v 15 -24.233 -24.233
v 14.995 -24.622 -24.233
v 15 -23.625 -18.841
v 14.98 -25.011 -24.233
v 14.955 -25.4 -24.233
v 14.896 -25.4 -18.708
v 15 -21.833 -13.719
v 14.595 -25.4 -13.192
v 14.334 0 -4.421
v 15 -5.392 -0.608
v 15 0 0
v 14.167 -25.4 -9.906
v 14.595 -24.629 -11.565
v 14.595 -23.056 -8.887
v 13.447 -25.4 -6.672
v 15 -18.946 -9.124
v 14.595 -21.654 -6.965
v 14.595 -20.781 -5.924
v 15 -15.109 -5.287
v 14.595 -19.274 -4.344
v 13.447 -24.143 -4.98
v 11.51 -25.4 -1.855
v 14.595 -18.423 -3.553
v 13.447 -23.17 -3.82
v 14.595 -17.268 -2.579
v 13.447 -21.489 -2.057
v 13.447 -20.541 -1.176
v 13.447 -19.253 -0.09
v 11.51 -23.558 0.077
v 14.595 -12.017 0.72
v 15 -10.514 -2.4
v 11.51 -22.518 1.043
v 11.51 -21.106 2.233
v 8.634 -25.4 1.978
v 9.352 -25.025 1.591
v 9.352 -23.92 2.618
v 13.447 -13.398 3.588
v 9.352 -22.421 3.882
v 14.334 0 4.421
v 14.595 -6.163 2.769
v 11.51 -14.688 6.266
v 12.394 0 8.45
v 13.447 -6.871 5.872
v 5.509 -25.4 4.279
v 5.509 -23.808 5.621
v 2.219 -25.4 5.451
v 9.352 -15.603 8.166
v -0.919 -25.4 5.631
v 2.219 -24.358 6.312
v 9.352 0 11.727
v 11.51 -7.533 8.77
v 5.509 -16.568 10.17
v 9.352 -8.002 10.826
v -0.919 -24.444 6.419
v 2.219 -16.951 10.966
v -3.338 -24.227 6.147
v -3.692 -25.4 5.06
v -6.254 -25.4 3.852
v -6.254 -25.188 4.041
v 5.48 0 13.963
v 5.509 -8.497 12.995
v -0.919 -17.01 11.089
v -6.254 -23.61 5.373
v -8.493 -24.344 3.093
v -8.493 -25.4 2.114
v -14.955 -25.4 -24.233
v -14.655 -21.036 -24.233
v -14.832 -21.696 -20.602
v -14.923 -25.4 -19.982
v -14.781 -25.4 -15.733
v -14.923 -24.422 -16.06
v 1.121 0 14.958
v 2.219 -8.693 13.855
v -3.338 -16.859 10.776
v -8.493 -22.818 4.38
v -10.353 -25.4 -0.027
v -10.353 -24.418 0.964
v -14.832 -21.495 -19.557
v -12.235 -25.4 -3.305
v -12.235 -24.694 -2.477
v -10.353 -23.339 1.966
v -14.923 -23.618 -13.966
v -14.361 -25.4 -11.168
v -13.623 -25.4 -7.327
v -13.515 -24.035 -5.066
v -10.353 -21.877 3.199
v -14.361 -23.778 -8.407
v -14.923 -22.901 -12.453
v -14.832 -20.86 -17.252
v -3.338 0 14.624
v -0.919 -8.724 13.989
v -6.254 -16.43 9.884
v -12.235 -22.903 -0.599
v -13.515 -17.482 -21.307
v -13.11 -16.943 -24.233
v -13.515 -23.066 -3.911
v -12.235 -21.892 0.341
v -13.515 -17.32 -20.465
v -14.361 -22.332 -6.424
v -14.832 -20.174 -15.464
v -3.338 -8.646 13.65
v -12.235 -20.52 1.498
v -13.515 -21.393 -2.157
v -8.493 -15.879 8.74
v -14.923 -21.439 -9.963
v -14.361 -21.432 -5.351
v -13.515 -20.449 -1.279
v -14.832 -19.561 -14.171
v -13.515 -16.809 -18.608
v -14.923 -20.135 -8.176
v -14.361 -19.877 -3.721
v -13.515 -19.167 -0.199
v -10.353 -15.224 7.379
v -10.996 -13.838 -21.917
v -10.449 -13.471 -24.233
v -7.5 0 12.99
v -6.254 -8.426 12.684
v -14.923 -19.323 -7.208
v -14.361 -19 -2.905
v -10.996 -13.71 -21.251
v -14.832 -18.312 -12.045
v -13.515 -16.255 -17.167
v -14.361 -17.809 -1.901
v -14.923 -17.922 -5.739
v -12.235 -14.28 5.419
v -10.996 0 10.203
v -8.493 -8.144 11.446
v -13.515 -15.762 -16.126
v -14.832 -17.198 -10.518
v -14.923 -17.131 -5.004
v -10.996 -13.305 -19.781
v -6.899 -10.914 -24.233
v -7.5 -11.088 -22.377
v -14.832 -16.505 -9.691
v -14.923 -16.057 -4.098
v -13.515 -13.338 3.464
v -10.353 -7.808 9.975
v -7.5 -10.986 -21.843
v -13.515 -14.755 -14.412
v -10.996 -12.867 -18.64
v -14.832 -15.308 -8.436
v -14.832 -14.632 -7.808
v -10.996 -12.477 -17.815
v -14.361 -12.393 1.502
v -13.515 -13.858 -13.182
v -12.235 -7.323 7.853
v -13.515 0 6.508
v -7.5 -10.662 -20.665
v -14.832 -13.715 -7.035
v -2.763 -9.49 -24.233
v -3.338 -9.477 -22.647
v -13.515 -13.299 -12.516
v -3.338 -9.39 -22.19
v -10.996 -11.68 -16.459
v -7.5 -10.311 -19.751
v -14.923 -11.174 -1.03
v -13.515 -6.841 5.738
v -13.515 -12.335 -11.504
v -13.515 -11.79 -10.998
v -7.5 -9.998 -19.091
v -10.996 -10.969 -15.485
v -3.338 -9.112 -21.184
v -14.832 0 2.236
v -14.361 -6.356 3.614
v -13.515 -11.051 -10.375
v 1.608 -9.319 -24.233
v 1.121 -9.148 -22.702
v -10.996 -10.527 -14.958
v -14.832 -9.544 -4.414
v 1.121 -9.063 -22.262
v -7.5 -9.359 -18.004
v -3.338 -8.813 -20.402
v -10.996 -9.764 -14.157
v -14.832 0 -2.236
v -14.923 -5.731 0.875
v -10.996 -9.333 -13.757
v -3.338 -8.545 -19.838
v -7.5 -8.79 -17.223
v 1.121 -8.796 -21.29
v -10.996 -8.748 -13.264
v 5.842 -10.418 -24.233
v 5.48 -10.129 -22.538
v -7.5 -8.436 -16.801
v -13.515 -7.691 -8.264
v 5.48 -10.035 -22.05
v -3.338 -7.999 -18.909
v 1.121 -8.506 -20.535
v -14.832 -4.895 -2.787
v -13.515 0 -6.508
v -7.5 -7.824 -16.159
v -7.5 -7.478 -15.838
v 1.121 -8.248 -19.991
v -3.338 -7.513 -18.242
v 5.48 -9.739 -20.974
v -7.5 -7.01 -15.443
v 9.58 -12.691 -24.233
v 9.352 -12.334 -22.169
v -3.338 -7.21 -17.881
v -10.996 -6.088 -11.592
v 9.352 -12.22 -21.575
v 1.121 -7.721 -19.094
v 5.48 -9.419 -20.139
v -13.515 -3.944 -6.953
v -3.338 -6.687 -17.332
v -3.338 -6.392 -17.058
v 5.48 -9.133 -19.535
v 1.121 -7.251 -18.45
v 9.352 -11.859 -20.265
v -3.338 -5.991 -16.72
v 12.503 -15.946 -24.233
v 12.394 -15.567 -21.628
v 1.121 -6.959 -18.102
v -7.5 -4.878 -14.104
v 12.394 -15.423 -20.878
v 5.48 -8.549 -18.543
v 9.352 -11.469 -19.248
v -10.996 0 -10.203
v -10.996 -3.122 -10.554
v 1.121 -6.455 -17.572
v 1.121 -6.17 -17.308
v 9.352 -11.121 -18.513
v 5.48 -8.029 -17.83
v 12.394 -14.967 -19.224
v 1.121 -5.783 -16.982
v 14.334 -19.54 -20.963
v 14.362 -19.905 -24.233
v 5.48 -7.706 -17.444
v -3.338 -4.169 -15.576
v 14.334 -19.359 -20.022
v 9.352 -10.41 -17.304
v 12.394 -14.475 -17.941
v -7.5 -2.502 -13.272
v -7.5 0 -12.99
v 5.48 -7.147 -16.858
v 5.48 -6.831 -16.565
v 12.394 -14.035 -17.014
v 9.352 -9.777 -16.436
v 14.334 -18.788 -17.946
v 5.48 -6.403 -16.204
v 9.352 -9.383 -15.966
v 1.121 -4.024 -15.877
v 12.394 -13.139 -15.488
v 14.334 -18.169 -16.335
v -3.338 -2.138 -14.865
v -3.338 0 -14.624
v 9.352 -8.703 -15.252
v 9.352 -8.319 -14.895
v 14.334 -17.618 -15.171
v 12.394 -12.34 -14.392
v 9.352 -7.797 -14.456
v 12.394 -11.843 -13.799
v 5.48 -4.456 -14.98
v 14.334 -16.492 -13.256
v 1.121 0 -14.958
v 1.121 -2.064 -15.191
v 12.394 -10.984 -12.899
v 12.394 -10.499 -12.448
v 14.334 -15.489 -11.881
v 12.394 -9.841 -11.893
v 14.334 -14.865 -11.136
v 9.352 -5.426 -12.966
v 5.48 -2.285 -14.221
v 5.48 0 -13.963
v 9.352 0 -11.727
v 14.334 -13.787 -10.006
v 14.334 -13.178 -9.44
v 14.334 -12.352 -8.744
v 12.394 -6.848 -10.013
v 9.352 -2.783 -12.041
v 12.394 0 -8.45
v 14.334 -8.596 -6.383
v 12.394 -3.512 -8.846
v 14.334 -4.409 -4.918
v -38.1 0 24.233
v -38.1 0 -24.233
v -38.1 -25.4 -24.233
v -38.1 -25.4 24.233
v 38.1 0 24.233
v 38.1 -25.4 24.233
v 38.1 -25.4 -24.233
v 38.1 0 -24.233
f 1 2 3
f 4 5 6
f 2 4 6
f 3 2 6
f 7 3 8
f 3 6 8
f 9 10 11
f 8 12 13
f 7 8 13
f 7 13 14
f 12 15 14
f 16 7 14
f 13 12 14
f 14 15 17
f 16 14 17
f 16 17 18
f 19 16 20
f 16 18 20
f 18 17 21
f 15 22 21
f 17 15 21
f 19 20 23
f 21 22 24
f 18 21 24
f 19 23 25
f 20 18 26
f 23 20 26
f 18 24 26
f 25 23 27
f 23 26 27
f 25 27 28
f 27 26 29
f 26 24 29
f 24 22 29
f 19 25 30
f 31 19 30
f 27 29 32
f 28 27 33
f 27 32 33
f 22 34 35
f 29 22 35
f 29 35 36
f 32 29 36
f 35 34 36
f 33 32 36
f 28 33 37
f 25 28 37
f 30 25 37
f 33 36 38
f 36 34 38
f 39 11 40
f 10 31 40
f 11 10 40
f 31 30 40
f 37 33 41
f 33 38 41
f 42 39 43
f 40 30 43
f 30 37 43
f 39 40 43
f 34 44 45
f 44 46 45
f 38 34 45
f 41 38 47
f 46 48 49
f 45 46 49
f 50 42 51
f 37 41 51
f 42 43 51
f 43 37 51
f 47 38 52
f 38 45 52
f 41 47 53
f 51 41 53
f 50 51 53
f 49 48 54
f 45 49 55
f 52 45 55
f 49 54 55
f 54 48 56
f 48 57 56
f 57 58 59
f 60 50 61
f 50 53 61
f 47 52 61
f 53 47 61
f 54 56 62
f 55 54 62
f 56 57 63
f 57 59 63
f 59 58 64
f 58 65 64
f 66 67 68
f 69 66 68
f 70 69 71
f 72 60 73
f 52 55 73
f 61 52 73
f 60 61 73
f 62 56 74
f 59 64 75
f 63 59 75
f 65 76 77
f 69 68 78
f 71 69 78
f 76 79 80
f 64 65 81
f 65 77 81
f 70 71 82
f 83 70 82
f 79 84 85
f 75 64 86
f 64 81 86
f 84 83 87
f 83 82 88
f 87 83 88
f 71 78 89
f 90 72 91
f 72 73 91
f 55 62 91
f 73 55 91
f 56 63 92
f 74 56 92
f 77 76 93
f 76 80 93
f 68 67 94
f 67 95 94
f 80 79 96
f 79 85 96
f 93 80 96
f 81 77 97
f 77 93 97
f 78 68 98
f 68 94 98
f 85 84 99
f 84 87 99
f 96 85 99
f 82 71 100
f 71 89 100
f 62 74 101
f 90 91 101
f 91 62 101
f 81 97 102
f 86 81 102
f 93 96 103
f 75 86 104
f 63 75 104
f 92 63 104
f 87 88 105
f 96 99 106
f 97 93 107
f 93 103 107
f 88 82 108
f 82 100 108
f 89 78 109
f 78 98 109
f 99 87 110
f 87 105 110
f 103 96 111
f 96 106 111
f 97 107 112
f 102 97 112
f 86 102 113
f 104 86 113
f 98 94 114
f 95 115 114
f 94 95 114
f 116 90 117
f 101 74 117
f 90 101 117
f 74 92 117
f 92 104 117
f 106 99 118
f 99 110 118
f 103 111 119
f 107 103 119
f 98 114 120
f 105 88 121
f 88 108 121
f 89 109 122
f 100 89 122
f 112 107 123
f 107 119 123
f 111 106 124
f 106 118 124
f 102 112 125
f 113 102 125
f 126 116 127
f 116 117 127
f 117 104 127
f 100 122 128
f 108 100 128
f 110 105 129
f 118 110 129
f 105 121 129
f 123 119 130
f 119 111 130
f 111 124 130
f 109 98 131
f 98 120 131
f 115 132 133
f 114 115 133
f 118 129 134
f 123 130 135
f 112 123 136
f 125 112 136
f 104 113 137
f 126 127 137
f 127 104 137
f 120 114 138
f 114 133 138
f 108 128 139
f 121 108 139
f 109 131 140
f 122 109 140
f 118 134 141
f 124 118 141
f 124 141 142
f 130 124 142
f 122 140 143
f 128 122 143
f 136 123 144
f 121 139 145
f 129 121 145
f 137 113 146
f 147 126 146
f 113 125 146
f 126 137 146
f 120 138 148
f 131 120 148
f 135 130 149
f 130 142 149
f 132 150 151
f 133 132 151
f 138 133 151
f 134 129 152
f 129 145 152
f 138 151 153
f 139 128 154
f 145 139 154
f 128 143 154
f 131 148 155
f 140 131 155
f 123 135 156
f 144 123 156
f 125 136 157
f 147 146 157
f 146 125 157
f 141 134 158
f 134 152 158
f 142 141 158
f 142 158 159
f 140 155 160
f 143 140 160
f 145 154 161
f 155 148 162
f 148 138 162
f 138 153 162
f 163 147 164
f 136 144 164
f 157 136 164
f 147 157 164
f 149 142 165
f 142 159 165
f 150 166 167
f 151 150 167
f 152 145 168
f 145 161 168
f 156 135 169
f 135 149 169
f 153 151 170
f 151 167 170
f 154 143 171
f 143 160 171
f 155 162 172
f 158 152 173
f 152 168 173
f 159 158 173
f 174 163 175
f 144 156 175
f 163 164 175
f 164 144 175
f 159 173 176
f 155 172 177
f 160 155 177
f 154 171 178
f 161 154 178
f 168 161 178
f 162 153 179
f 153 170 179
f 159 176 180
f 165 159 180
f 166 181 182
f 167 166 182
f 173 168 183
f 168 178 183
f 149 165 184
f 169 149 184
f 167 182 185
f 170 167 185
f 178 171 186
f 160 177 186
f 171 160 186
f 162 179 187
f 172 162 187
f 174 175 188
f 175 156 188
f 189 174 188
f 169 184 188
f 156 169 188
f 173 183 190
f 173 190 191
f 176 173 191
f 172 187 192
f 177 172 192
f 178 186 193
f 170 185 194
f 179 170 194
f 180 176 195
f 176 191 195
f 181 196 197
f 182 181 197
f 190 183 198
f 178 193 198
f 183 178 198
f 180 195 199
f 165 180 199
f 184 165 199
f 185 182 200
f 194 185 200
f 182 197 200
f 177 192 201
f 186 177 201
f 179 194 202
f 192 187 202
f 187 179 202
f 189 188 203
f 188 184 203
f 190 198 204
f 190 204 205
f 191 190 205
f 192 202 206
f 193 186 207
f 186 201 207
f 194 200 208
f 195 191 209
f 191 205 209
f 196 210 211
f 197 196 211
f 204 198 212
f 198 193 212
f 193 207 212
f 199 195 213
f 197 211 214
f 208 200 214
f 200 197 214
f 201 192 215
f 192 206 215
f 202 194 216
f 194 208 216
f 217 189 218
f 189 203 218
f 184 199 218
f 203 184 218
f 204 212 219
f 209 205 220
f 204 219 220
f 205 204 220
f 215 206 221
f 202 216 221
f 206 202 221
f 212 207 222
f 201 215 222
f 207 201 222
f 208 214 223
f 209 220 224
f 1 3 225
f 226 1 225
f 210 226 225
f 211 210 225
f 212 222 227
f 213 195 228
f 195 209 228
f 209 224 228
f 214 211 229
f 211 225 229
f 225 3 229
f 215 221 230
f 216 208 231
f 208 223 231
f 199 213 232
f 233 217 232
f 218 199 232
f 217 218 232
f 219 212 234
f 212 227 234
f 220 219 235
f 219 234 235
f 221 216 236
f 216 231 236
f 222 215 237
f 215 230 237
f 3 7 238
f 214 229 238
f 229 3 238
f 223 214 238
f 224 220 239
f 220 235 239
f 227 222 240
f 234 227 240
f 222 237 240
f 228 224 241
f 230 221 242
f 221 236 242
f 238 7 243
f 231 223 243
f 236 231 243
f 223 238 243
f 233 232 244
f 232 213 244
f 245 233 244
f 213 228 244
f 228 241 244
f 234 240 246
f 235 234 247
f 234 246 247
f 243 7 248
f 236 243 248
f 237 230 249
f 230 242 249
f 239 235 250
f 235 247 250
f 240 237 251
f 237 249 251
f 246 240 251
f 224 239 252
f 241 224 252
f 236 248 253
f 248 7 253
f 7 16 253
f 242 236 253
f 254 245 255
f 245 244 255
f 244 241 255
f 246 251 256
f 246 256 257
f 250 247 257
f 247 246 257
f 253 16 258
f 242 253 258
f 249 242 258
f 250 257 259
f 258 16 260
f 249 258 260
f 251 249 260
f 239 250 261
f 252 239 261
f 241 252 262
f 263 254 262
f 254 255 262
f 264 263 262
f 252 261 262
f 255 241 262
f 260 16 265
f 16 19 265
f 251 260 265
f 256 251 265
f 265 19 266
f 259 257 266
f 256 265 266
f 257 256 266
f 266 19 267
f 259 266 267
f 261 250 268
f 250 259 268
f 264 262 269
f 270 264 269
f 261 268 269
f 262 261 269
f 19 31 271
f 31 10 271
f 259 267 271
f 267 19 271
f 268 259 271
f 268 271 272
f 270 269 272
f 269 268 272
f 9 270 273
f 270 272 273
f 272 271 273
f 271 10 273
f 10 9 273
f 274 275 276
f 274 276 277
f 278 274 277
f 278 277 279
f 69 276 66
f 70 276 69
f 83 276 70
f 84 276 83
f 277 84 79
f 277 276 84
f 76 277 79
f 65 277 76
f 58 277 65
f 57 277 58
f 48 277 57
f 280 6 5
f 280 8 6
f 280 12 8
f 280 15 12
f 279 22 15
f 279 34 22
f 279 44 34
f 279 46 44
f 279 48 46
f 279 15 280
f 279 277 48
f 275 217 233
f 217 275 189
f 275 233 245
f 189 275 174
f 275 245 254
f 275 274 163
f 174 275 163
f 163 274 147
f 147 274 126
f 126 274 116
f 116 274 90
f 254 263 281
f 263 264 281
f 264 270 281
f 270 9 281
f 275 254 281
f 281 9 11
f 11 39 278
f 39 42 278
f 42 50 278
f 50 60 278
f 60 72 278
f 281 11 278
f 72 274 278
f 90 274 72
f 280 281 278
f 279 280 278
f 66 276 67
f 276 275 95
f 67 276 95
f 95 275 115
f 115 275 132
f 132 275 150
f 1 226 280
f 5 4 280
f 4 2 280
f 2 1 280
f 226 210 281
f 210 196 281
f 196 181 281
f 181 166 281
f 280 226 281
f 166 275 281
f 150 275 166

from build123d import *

# Parameters (mm, degrees)
F0_W     = 76.2
F0_H     = 48.466104
F1_DEPTH = 25.4
F2_R     = 15


with BuildPart() as f1:
    # F0 (on Front) → F1 (new body)
    with BuildSketch(Plane.XZ):
        Rectangle(F0_W, F0_H)
    extrude(amount=F1_DEPTH)

    # F2 (on face) → F3 (revolve, cut)
    with BuildSketch(Plane.XZ):
        Circle(F2_R)
    revolve(axis=Axis((0, 0, -24.233052), (-1, 0, 0)), mode=Mode.SUBTRACT)


solid = f1.part
